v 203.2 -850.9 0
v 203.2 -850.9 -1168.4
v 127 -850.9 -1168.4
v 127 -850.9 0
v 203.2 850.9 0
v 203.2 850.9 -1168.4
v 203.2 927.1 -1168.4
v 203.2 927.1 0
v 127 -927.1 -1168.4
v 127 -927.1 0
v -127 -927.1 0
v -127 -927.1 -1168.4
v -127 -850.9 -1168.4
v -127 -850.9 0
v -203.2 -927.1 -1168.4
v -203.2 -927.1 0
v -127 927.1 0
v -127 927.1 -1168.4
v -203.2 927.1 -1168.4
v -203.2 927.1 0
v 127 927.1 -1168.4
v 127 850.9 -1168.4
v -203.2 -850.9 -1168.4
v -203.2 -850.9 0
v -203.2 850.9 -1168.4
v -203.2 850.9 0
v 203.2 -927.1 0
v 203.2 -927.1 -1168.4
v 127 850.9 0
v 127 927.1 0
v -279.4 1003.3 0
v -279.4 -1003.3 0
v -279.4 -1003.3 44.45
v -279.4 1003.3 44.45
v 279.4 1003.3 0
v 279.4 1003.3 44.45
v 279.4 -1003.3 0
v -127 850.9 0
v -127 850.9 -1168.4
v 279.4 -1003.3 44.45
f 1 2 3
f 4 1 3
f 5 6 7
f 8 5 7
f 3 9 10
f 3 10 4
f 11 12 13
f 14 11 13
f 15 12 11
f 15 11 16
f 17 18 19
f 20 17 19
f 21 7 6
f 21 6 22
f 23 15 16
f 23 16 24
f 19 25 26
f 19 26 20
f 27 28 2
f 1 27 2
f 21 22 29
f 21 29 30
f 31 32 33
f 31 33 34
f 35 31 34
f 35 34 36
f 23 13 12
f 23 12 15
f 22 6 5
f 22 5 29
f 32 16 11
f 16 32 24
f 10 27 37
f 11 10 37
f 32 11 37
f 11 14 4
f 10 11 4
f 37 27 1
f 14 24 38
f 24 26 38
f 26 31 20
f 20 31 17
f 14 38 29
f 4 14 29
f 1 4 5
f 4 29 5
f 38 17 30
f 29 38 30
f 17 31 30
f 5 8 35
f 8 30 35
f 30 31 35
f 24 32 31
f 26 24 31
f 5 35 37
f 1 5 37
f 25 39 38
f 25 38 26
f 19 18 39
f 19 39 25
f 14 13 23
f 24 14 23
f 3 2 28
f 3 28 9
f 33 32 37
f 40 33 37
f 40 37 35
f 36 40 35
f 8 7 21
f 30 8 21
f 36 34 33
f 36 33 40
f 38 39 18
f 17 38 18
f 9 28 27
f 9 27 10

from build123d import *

# Parameters (mm, degrees)
SKETCH1_W           = 558.8
SKETCH1_H           = 2006.6
BOSS_EXTRUDE1_DEPTH = 44.45
SKETCH5_W           = 76.2
SKETCH5_H           = 76.2
BOSS_EXTRUDE2_DEPTH = 1168.4


with BuildPart() as part:
    # Sketch1 → Boss-Extrude1 (new body)
    with BuildSketch(Plane.XY):
        Rectangle(SKETCH1_W, SKETCH1_H)
    extrude(amount=BOSS_EXTRUDE1_DEPTH)

    # Sketch5 → Boss-Extrude2 (add)
    with BuildSketch(Plane(origin=(0, 0, 0), x_dir=(-1, 0, 0), z_dir=(0, 0, -1))):
        with Locations((-165.1, 889)):
            Rectangle(SKETCH5_W, SKETCH5_H)
        with Locations((165.1, 889)):
            Rectangle(SKETCH5_W, SKETCH5_H)
        with Locations((-165.1, -889)):
            Rectangle(SKETCH5_W, SKETCH5_H)
        with Locations((165.1, -889)):
            Rectangle(SKETCH5_W, SKETCH5_H)
    extrude(amount=BOSS_EXTRUDE2_DEPTH)


solid = part.part
